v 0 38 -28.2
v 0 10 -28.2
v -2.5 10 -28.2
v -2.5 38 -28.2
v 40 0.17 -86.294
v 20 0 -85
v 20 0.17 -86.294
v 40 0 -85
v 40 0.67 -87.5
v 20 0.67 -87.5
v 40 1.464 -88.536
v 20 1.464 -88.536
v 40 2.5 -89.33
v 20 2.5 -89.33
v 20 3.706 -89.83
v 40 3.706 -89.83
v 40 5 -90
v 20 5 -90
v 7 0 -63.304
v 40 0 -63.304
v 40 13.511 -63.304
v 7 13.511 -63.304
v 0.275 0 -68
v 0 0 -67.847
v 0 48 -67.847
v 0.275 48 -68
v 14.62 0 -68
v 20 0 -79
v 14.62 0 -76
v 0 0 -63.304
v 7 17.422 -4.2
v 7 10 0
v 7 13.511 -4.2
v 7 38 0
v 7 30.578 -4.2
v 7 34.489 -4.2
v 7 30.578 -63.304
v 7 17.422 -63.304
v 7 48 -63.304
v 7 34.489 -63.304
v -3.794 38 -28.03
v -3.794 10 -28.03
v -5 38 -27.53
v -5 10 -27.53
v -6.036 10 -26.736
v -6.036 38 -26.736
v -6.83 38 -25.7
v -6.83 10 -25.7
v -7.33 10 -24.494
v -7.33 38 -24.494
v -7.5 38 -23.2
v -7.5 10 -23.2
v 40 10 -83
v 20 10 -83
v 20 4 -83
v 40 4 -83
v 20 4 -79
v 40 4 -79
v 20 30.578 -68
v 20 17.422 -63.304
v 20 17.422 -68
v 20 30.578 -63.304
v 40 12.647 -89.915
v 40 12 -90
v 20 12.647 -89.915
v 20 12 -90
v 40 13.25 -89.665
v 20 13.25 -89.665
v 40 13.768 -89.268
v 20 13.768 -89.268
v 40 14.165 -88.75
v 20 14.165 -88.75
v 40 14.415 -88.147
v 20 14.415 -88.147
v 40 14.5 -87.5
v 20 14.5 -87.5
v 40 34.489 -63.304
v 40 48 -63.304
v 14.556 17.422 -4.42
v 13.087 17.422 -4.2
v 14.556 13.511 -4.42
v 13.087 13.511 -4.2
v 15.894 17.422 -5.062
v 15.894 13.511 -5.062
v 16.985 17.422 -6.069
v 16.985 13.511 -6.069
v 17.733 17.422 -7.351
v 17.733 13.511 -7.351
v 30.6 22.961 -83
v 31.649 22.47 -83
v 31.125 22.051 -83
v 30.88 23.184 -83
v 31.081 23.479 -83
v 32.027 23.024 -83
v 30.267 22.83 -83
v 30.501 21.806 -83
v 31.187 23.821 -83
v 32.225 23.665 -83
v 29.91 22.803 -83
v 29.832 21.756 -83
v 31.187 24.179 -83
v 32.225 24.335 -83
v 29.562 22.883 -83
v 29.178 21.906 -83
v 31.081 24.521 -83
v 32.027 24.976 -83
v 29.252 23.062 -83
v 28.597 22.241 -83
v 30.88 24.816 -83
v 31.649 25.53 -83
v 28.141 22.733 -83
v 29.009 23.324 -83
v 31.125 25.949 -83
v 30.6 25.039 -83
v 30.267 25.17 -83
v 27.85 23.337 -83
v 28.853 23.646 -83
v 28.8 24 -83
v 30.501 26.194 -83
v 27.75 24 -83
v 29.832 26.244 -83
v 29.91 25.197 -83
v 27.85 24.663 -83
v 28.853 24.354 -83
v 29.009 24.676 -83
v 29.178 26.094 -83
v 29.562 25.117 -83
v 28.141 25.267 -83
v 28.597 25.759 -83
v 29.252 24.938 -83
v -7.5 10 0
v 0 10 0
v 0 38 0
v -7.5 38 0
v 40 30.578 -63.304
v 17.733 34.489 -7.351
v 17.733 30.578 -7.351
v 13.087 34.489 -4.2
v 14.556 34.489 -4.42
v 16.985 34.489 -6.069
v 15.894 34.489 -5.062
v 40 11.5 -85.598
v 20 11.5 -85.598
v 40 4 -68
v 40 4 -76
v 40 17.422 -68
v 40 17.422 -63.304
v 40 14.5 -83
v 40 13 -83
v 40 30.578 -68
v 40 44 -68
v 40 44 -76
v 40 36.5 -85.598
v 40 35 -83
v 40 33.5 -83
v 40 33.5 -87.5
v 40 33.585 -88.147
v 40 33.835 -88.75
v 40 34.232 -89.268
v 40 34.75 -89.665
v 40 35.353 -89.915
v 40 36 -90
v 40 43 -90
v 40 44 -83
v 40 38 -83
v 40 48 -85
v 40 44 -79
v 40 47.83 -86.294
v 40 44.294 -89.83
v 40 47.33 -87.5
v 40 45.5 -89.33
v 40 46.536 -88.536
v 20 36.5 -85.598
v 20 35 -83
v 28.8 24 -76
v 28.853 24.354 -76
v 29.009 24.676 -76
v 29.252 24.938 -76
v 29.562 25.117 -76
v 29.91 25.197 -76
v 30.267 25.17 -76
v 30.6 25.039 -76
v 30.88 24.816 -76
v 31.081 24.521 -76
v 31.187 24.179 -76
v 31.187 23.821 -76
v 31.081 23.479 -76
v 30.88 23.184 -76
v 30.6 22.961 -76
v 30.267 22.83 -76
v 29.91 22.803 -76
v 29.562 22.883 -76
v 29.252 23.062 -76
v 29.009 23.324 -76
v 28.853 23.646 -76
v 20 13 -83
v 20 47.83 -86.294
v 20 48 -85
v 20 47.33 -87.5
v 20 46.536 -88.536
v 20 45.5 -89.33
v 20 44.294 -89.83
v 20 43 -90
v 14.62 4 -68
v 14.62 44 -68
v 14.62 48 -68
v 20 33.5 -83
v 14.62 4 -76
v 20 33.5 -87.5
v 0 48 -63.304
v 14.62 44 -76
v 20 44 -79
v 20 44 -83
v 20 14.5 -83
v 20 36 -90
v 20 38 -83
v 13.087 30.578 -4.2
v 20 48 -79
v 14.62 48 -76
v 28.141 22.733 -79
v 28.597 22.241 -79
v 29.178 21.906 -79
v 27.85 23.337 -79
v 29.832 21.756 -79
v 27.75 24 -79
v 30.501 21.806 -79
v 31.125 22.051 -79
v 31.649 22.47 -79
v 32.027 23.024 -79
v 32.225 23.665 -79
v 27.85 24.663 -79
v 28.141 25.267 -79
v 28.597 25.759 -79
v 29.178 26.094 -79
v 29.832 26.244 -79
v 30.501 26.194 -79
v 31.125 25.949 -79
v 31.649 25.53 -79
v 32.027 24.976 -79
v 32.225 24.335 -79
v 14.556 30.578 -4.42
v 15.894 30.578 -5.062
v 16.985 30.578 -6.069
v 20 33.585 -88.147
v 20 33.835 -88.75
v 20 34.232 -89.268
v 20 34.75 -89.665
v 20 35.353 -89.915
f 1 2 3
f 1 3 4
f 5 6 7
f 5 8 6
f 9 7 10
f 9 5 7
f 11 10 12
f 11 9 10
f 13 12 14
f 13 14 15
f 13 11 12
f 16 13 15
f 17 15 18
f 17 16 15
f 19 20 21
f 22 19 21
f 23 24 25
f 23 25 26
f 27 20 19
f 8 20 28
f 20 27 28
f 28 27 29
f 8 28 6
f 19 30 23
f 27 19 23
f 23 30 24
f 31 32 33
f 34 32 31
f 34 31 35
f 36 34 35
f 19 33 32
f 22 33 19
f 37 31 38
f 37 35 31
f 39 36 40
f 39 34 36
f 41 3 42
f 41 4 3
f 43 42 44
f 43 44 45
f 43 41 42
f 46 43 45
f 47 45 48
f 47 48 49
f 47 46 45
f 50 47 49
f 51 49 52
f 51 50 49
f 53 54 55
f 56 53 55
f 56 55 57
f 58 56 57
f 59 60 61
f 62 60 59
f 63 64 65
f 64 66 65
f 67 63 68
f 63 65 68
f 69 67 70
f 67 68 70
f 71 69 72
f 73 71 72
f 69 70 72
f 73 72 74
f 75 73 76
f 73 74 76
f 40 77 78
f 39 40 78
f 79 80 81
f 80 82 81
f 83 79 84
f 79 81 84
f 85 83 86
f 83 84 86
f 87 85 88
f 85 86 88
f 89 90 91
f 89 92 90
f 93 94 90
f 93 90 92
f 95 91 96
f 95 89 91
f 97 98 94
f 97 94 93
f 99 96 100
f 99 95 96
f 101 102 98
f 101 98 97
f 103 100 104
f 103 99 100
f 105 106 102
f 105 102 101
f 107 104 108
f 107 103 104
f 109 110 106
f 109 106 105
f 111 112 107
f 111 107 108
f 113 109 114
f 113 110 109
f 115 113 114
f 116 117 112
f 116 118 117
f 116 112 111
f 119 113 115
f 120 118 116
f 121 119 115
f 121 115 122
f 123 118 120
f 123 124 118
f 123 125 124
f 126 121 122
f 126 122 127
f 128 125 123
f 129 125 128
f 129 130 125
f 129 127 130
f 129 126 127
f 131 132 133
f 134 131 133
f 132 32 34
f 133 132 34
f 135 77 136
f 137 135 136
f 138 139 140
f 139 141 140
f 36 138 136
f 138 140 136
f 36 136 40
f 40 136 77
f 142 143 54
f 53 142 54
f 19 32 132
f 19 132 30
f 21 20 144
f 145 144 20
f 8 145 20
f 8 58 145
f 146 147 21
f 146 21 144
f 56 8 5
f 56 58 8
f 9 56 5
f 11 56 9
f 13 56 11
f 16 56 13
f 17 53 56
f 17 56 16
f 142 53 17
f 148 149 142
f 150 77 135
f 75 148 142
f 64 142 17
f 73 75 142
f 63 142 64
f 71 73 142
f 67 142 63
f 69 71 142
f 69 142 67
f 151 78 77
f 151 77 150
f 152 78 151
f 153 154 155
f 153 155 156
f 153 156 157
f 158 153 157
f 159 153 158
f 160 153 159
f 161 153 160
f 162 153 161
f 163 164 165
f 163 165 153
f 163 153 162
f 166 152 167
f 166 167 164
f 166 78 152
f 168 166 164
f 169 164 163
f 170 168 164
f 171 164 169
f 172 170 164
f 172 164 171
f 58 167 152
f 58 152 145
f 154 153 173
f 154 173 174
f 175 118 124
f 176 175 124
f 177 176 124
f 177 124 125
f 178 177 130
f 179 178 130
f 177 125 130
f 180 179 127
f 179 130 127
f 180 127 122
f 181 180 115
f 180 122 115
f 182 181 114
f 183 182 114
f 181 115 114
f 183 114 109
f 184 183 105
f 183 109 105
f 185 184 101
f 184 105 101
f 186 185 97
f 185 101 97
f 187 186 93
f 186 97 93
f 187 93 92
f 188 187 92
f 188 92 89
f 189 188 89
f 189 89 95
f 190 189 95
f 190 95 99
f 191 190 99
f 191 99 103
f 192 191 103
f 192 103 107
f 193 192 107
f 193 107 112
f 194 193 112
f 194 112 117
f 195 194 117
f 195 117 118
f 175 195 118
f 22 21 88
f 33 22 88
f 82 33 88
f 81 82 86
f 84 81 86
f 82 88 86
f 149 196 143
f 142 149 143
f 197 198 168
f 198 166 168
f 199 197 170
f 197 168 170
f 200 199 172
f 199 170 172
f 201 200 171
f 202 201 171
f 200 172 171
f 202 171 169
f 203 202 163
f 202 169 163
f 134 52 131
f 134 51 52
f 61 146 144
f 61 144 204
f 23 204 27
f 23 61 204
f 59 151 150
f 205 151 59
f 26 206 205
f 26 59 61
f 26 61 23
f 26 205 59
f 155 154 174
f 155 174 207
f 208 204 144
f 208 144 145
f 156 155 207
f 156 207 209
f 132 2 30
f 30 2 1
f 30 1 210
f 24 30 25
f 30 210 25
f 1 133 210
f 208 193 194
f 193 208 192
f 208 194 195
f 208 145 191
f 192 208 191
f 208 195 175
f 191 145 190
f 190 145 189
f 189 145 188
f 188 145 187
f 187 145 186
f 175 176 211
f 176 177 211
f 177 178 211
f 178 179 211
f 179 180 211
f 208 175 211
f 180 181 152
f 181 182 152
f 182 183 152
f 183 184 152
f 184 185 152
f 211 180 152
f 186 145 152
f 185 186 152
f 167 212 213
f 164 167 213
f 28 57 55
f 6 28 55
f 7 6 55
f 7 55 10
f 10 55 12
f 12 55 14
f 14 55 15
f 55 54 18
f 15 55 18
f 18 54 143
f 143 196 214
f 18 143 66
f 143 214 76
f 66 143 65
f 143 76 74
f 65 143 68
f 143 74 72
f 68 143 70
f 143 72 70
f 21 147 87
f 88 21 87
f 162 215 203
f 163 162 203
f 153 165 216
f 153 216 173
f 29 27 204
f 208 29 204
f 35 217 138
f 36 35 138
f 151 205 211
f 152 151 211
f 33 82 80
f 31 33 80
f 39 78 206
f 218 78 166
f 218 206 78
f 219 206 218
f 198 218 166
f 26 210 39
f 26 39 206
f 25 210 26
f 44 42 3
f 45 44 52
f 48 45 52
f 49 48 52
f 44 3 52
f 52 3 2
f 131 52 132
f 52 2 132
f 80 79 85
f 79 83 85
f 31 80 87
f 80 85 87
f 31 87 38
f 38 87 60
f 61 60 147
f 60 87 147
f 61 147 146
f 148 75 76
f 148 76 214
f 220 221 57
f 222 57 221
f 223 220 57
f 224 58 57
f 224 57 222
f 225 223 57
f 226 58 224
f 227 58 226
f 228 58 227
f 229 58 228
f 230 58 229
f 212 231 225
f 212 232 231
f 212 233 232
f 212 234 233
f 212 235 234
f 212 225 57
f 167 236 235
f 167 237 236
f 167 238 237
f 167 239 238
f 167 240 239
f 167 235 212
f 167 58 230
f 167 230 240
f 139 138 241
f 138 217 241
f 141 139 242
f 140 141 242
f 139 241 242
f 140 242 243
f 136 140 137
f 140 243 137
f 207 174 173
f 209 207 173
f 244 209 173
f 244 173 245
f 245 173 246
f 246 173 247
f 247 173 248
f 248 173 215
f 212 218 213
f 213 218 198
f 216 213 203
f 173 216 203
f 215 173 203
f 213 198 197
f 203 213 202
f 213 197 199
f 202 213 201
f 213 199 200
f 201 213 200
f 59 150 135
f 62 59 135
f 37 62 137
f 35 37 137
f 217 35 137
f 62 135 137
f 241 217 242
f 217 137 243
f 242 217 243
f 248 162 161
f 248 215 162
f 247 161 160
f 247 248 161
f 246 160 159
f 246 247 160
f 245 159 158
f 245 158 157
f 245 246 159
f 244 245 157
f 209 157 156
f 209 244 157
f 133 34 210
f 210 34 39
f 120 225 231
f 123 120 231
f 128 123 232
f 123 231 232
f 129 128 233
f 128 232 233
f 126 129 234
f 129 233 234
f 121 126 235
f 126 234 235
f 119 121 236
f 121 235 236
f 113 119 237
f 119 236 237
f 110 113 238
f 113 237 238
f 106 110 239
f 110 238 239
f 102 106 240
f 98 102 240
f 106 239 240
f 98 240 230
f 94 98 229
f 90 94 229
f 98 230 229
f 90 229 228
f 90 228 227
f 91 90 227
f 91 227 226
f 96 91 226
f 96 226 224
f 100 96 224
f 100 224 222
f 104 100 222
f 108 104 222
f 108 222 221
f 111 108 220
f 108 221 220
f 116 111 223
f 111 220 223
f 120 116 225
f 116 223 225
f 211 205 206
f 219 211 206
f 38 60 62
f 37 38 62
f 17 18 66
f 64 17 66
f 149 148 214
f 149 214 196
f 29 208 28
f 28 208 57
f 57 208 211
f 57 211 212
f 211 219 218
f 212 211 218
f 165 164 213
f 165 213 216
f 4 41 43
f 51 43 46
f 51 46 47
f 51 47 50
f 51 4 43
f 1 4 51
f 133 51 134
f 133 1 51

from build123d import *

# Parameters (mm, degrees)
SKETCH_1_W          = 90
SKETCH_1_H          = 48
EXTRUDE_1_DEPTH     = 40
CUT_EXTRUDE_1_DEPTH = 40
CUT_EXTRUDE_2_DEPTH = 49
CUT_EXTRUDE_3_DEPTH = 49
CUT_EXTRUDE_4_DEPTH = 33
SKETCH_6_W          = 8
SKETCH_6_H          = 40
CUT_EXTRUDE_5_DEPTH = 41
SKETCH_7_W          = 20
SKETCH_7_H          = 13.155555556
CUT_EXTRUDE_6_DEPTH = 5
SKETCH_8_W          = 28.2
SKETCH_8_H          = 28
EXTRUDE_2_DEPTH     = 7.5
SKETCH_9_R          = 2.25
EXTRUDE_3_DEPTH     = 4
SKETCH_10_R         = 1.2
CUT_EXTRUDE_7_DEPTH = 84
FILLET_1_R          = 5
FILLET_2_R          = 2.5
SKETCH_11_W         = 14.62039328
SKETCH_11_H         = 48
CUT_EXTRUDE_8_DEPTH = 10


with BuildPart() as part:
    # 스케치1 → 보스-돌출1 (new body)
    with BuildSketch(Plane(origin=(0, 0, 0), x_dir=(0, 0, -1), z_dir=(1, 0, 0))):
        with Locations((45, 24)):
            Rectangle(SKETCH_1_W, SKETCH_1_H)
    extrude(amount=EXTRUDE_1_DEPTH)

    # 스케치2 → 컷-돌출1 (cut)
    with BuildSketch(Plane(origin=(40, 0, 0), x_dir=(0, 0, -1), z_dir=(1, 0, 0))):
        Polygon((79, 44), (83, 44), (83, 38), (85.598076211, 36.5), (83, 35), (83, 33.5), (90, 33.5), (90, 14.5), (83, 14.5), (83, 13), (85.598076211, 11.5), (83, 10), (83, 4), (79, 4), align=None)
        Polygon((0, 38), (63.304035288, 48), (0, 48), align=None)
        Polygon((0, 10), (63.304035288, 0), (0, 0), align=None)
    extrude(amount=-CUT_EXTRUDE_1_DEPTH, mode=Mode.SUBTRACT)

    # 스케치3 → 컷-돌출2 (cut, through all)
    with BuildSketch(Plane(origin=(0, 48, 0), x_dir=(1, 0, 0), z_dir=(0, 1, 0))):
        Polygon((0, 67.846768337), (20, 79), (20, 90), (0, 90), align=None)
    extrude(amount=-CUT_EXTRUDE_2_DEPTH, mode=Mode.SUBTRACT)

    # 스케치4 → 컷-돌출3 (cut, through all)
    with BuildSketch(Plane(origin=(0, 48, 0), x_dir=(1, 0, 0), z_dir=(0, 1, 0))):
        Polygon((40, 63.304035288), (14.807552651, 0), (40, 0), align=None)
    extrude(amount=-CUT_EXTRUDE_3_DEPTH, mode=Mode.SUBTRACT)

    # 스케치5 → 컷-돌출4 (cut)
    with BuildSketch(Plane(origin=(40, 0, 0), x_dir=(0, 0, -1), z_dir=(1, 0, 0))):
        Polygon((4.2, 34.488888889), (63.304035288, 34.488888889), (63.304035288, 48), (0, 38), (0, 10), (63.304035288, 0), (63.304035288, 13.511111111), (4.2, 13.511111111), (4.2, 17.422222222), (63.304035288, 17.422222222), (63.304035288, 30.577777778), (4.2, 30.577777778), align=None)
    extrude(amount=-CUT_EXTRUDE_4_DEPTH, mode=Mode.SUBTRACT)

    # 스케치6 → 컷-돌출5 (cut, through all)
    with BuildSketch(Plane(origin=(40, 0, 0), x_dir=(0, 0, -1), z_dir=(1, 0, 0))):
        with Locations((72, 24)):
            Rectangle(SKETCH_6_W, SKETCH_6_H)
    extrude(amount=-CUT_EXTRUDE_5_DEPTH, mode=Mode.SUBTRACT)

    # 스케치7 → 컷-돌출6 (cut)
    with BuildSketch(Plane.XY.offset(-63.304035288)):
        with Locations((30, 24)):
            Rectangle(SKETCH_7_W, SKETCH_7_H)
    extrude(amount=-CUT_EXTRUDE_6_DEPTH, mode=Mode.SUBTRACT)

    # 스케치8 → 보스-돌출2 (add)
    with BuildSketch(Plane.ZY):
        with Locations((-14.1, 24)):
            Rectangle(SKETCH_8_W, SKETCH_8_H)
    extrude(amount=EXTRUDE_2_DEPTH)

    # 스케치9 → 보스-돌출3 (add)
    with BuildSketch(Plane(origin=(0, 0, -79), x_dir=(-1, 0, 0), z_dir=(0, 0, -1))):
        with Locations((-30, 24)):
            Circle(SKETCH_9_R)
    extrude(amount=EXTRUDE_3_DEPTH)

    # 스케치10 → 컷-돌출7 (cut, through all)
    with BuildSketch(Plane(origin=(0, 0, -83), x_dir=(-1, 0, 0), z_dir=(0, 0, -1))):
        with Locations((-30, 24)):
            Circle(SKETCH_10_R)
    extrude(amount=-CUT_EXTRUDE_7_DEPTH, mode=Mode.SUBTRACT)

    # 필렛1
    fillet_1_edges = [part.edges().sort_by_distance(p)[0] for p in [
        (16.47898289, 32.533333333, -4.2),
        (16.47898289, 15.466666667, -4.2),
        (-7.5, 24, -28.2),
        (30, 48, -90),
        (30, 0, -90),
    ]]
    fillet(fillet_1_edges, radius=FILLET_1_R)

    # 필렛2
    fillet_2_edges = [part.edges().sort_by_distance(p)[0] for p in [
        (30, 14.5, -90),
        (30, 33.5, -90),
    ]]
    fillet(fillet_2_edges, radius=FILLET_2_R)

    # 스케치11 → 컷-돌출8 (cut)
    with BuildSketch(Plane(origin=(0, 0, -68), x_dir=(-1, 0, 0), z_dir=(0, 0, -1))):
        with Locations((-7.31019664, 24)):
            Rectangle(SKETCH_11_W, SKETCH_11_H)
    extrude(amount=CUT_EXTRUDE_8_DEPTH, mode=Mode.SUBTRACT)


solid = part.part
